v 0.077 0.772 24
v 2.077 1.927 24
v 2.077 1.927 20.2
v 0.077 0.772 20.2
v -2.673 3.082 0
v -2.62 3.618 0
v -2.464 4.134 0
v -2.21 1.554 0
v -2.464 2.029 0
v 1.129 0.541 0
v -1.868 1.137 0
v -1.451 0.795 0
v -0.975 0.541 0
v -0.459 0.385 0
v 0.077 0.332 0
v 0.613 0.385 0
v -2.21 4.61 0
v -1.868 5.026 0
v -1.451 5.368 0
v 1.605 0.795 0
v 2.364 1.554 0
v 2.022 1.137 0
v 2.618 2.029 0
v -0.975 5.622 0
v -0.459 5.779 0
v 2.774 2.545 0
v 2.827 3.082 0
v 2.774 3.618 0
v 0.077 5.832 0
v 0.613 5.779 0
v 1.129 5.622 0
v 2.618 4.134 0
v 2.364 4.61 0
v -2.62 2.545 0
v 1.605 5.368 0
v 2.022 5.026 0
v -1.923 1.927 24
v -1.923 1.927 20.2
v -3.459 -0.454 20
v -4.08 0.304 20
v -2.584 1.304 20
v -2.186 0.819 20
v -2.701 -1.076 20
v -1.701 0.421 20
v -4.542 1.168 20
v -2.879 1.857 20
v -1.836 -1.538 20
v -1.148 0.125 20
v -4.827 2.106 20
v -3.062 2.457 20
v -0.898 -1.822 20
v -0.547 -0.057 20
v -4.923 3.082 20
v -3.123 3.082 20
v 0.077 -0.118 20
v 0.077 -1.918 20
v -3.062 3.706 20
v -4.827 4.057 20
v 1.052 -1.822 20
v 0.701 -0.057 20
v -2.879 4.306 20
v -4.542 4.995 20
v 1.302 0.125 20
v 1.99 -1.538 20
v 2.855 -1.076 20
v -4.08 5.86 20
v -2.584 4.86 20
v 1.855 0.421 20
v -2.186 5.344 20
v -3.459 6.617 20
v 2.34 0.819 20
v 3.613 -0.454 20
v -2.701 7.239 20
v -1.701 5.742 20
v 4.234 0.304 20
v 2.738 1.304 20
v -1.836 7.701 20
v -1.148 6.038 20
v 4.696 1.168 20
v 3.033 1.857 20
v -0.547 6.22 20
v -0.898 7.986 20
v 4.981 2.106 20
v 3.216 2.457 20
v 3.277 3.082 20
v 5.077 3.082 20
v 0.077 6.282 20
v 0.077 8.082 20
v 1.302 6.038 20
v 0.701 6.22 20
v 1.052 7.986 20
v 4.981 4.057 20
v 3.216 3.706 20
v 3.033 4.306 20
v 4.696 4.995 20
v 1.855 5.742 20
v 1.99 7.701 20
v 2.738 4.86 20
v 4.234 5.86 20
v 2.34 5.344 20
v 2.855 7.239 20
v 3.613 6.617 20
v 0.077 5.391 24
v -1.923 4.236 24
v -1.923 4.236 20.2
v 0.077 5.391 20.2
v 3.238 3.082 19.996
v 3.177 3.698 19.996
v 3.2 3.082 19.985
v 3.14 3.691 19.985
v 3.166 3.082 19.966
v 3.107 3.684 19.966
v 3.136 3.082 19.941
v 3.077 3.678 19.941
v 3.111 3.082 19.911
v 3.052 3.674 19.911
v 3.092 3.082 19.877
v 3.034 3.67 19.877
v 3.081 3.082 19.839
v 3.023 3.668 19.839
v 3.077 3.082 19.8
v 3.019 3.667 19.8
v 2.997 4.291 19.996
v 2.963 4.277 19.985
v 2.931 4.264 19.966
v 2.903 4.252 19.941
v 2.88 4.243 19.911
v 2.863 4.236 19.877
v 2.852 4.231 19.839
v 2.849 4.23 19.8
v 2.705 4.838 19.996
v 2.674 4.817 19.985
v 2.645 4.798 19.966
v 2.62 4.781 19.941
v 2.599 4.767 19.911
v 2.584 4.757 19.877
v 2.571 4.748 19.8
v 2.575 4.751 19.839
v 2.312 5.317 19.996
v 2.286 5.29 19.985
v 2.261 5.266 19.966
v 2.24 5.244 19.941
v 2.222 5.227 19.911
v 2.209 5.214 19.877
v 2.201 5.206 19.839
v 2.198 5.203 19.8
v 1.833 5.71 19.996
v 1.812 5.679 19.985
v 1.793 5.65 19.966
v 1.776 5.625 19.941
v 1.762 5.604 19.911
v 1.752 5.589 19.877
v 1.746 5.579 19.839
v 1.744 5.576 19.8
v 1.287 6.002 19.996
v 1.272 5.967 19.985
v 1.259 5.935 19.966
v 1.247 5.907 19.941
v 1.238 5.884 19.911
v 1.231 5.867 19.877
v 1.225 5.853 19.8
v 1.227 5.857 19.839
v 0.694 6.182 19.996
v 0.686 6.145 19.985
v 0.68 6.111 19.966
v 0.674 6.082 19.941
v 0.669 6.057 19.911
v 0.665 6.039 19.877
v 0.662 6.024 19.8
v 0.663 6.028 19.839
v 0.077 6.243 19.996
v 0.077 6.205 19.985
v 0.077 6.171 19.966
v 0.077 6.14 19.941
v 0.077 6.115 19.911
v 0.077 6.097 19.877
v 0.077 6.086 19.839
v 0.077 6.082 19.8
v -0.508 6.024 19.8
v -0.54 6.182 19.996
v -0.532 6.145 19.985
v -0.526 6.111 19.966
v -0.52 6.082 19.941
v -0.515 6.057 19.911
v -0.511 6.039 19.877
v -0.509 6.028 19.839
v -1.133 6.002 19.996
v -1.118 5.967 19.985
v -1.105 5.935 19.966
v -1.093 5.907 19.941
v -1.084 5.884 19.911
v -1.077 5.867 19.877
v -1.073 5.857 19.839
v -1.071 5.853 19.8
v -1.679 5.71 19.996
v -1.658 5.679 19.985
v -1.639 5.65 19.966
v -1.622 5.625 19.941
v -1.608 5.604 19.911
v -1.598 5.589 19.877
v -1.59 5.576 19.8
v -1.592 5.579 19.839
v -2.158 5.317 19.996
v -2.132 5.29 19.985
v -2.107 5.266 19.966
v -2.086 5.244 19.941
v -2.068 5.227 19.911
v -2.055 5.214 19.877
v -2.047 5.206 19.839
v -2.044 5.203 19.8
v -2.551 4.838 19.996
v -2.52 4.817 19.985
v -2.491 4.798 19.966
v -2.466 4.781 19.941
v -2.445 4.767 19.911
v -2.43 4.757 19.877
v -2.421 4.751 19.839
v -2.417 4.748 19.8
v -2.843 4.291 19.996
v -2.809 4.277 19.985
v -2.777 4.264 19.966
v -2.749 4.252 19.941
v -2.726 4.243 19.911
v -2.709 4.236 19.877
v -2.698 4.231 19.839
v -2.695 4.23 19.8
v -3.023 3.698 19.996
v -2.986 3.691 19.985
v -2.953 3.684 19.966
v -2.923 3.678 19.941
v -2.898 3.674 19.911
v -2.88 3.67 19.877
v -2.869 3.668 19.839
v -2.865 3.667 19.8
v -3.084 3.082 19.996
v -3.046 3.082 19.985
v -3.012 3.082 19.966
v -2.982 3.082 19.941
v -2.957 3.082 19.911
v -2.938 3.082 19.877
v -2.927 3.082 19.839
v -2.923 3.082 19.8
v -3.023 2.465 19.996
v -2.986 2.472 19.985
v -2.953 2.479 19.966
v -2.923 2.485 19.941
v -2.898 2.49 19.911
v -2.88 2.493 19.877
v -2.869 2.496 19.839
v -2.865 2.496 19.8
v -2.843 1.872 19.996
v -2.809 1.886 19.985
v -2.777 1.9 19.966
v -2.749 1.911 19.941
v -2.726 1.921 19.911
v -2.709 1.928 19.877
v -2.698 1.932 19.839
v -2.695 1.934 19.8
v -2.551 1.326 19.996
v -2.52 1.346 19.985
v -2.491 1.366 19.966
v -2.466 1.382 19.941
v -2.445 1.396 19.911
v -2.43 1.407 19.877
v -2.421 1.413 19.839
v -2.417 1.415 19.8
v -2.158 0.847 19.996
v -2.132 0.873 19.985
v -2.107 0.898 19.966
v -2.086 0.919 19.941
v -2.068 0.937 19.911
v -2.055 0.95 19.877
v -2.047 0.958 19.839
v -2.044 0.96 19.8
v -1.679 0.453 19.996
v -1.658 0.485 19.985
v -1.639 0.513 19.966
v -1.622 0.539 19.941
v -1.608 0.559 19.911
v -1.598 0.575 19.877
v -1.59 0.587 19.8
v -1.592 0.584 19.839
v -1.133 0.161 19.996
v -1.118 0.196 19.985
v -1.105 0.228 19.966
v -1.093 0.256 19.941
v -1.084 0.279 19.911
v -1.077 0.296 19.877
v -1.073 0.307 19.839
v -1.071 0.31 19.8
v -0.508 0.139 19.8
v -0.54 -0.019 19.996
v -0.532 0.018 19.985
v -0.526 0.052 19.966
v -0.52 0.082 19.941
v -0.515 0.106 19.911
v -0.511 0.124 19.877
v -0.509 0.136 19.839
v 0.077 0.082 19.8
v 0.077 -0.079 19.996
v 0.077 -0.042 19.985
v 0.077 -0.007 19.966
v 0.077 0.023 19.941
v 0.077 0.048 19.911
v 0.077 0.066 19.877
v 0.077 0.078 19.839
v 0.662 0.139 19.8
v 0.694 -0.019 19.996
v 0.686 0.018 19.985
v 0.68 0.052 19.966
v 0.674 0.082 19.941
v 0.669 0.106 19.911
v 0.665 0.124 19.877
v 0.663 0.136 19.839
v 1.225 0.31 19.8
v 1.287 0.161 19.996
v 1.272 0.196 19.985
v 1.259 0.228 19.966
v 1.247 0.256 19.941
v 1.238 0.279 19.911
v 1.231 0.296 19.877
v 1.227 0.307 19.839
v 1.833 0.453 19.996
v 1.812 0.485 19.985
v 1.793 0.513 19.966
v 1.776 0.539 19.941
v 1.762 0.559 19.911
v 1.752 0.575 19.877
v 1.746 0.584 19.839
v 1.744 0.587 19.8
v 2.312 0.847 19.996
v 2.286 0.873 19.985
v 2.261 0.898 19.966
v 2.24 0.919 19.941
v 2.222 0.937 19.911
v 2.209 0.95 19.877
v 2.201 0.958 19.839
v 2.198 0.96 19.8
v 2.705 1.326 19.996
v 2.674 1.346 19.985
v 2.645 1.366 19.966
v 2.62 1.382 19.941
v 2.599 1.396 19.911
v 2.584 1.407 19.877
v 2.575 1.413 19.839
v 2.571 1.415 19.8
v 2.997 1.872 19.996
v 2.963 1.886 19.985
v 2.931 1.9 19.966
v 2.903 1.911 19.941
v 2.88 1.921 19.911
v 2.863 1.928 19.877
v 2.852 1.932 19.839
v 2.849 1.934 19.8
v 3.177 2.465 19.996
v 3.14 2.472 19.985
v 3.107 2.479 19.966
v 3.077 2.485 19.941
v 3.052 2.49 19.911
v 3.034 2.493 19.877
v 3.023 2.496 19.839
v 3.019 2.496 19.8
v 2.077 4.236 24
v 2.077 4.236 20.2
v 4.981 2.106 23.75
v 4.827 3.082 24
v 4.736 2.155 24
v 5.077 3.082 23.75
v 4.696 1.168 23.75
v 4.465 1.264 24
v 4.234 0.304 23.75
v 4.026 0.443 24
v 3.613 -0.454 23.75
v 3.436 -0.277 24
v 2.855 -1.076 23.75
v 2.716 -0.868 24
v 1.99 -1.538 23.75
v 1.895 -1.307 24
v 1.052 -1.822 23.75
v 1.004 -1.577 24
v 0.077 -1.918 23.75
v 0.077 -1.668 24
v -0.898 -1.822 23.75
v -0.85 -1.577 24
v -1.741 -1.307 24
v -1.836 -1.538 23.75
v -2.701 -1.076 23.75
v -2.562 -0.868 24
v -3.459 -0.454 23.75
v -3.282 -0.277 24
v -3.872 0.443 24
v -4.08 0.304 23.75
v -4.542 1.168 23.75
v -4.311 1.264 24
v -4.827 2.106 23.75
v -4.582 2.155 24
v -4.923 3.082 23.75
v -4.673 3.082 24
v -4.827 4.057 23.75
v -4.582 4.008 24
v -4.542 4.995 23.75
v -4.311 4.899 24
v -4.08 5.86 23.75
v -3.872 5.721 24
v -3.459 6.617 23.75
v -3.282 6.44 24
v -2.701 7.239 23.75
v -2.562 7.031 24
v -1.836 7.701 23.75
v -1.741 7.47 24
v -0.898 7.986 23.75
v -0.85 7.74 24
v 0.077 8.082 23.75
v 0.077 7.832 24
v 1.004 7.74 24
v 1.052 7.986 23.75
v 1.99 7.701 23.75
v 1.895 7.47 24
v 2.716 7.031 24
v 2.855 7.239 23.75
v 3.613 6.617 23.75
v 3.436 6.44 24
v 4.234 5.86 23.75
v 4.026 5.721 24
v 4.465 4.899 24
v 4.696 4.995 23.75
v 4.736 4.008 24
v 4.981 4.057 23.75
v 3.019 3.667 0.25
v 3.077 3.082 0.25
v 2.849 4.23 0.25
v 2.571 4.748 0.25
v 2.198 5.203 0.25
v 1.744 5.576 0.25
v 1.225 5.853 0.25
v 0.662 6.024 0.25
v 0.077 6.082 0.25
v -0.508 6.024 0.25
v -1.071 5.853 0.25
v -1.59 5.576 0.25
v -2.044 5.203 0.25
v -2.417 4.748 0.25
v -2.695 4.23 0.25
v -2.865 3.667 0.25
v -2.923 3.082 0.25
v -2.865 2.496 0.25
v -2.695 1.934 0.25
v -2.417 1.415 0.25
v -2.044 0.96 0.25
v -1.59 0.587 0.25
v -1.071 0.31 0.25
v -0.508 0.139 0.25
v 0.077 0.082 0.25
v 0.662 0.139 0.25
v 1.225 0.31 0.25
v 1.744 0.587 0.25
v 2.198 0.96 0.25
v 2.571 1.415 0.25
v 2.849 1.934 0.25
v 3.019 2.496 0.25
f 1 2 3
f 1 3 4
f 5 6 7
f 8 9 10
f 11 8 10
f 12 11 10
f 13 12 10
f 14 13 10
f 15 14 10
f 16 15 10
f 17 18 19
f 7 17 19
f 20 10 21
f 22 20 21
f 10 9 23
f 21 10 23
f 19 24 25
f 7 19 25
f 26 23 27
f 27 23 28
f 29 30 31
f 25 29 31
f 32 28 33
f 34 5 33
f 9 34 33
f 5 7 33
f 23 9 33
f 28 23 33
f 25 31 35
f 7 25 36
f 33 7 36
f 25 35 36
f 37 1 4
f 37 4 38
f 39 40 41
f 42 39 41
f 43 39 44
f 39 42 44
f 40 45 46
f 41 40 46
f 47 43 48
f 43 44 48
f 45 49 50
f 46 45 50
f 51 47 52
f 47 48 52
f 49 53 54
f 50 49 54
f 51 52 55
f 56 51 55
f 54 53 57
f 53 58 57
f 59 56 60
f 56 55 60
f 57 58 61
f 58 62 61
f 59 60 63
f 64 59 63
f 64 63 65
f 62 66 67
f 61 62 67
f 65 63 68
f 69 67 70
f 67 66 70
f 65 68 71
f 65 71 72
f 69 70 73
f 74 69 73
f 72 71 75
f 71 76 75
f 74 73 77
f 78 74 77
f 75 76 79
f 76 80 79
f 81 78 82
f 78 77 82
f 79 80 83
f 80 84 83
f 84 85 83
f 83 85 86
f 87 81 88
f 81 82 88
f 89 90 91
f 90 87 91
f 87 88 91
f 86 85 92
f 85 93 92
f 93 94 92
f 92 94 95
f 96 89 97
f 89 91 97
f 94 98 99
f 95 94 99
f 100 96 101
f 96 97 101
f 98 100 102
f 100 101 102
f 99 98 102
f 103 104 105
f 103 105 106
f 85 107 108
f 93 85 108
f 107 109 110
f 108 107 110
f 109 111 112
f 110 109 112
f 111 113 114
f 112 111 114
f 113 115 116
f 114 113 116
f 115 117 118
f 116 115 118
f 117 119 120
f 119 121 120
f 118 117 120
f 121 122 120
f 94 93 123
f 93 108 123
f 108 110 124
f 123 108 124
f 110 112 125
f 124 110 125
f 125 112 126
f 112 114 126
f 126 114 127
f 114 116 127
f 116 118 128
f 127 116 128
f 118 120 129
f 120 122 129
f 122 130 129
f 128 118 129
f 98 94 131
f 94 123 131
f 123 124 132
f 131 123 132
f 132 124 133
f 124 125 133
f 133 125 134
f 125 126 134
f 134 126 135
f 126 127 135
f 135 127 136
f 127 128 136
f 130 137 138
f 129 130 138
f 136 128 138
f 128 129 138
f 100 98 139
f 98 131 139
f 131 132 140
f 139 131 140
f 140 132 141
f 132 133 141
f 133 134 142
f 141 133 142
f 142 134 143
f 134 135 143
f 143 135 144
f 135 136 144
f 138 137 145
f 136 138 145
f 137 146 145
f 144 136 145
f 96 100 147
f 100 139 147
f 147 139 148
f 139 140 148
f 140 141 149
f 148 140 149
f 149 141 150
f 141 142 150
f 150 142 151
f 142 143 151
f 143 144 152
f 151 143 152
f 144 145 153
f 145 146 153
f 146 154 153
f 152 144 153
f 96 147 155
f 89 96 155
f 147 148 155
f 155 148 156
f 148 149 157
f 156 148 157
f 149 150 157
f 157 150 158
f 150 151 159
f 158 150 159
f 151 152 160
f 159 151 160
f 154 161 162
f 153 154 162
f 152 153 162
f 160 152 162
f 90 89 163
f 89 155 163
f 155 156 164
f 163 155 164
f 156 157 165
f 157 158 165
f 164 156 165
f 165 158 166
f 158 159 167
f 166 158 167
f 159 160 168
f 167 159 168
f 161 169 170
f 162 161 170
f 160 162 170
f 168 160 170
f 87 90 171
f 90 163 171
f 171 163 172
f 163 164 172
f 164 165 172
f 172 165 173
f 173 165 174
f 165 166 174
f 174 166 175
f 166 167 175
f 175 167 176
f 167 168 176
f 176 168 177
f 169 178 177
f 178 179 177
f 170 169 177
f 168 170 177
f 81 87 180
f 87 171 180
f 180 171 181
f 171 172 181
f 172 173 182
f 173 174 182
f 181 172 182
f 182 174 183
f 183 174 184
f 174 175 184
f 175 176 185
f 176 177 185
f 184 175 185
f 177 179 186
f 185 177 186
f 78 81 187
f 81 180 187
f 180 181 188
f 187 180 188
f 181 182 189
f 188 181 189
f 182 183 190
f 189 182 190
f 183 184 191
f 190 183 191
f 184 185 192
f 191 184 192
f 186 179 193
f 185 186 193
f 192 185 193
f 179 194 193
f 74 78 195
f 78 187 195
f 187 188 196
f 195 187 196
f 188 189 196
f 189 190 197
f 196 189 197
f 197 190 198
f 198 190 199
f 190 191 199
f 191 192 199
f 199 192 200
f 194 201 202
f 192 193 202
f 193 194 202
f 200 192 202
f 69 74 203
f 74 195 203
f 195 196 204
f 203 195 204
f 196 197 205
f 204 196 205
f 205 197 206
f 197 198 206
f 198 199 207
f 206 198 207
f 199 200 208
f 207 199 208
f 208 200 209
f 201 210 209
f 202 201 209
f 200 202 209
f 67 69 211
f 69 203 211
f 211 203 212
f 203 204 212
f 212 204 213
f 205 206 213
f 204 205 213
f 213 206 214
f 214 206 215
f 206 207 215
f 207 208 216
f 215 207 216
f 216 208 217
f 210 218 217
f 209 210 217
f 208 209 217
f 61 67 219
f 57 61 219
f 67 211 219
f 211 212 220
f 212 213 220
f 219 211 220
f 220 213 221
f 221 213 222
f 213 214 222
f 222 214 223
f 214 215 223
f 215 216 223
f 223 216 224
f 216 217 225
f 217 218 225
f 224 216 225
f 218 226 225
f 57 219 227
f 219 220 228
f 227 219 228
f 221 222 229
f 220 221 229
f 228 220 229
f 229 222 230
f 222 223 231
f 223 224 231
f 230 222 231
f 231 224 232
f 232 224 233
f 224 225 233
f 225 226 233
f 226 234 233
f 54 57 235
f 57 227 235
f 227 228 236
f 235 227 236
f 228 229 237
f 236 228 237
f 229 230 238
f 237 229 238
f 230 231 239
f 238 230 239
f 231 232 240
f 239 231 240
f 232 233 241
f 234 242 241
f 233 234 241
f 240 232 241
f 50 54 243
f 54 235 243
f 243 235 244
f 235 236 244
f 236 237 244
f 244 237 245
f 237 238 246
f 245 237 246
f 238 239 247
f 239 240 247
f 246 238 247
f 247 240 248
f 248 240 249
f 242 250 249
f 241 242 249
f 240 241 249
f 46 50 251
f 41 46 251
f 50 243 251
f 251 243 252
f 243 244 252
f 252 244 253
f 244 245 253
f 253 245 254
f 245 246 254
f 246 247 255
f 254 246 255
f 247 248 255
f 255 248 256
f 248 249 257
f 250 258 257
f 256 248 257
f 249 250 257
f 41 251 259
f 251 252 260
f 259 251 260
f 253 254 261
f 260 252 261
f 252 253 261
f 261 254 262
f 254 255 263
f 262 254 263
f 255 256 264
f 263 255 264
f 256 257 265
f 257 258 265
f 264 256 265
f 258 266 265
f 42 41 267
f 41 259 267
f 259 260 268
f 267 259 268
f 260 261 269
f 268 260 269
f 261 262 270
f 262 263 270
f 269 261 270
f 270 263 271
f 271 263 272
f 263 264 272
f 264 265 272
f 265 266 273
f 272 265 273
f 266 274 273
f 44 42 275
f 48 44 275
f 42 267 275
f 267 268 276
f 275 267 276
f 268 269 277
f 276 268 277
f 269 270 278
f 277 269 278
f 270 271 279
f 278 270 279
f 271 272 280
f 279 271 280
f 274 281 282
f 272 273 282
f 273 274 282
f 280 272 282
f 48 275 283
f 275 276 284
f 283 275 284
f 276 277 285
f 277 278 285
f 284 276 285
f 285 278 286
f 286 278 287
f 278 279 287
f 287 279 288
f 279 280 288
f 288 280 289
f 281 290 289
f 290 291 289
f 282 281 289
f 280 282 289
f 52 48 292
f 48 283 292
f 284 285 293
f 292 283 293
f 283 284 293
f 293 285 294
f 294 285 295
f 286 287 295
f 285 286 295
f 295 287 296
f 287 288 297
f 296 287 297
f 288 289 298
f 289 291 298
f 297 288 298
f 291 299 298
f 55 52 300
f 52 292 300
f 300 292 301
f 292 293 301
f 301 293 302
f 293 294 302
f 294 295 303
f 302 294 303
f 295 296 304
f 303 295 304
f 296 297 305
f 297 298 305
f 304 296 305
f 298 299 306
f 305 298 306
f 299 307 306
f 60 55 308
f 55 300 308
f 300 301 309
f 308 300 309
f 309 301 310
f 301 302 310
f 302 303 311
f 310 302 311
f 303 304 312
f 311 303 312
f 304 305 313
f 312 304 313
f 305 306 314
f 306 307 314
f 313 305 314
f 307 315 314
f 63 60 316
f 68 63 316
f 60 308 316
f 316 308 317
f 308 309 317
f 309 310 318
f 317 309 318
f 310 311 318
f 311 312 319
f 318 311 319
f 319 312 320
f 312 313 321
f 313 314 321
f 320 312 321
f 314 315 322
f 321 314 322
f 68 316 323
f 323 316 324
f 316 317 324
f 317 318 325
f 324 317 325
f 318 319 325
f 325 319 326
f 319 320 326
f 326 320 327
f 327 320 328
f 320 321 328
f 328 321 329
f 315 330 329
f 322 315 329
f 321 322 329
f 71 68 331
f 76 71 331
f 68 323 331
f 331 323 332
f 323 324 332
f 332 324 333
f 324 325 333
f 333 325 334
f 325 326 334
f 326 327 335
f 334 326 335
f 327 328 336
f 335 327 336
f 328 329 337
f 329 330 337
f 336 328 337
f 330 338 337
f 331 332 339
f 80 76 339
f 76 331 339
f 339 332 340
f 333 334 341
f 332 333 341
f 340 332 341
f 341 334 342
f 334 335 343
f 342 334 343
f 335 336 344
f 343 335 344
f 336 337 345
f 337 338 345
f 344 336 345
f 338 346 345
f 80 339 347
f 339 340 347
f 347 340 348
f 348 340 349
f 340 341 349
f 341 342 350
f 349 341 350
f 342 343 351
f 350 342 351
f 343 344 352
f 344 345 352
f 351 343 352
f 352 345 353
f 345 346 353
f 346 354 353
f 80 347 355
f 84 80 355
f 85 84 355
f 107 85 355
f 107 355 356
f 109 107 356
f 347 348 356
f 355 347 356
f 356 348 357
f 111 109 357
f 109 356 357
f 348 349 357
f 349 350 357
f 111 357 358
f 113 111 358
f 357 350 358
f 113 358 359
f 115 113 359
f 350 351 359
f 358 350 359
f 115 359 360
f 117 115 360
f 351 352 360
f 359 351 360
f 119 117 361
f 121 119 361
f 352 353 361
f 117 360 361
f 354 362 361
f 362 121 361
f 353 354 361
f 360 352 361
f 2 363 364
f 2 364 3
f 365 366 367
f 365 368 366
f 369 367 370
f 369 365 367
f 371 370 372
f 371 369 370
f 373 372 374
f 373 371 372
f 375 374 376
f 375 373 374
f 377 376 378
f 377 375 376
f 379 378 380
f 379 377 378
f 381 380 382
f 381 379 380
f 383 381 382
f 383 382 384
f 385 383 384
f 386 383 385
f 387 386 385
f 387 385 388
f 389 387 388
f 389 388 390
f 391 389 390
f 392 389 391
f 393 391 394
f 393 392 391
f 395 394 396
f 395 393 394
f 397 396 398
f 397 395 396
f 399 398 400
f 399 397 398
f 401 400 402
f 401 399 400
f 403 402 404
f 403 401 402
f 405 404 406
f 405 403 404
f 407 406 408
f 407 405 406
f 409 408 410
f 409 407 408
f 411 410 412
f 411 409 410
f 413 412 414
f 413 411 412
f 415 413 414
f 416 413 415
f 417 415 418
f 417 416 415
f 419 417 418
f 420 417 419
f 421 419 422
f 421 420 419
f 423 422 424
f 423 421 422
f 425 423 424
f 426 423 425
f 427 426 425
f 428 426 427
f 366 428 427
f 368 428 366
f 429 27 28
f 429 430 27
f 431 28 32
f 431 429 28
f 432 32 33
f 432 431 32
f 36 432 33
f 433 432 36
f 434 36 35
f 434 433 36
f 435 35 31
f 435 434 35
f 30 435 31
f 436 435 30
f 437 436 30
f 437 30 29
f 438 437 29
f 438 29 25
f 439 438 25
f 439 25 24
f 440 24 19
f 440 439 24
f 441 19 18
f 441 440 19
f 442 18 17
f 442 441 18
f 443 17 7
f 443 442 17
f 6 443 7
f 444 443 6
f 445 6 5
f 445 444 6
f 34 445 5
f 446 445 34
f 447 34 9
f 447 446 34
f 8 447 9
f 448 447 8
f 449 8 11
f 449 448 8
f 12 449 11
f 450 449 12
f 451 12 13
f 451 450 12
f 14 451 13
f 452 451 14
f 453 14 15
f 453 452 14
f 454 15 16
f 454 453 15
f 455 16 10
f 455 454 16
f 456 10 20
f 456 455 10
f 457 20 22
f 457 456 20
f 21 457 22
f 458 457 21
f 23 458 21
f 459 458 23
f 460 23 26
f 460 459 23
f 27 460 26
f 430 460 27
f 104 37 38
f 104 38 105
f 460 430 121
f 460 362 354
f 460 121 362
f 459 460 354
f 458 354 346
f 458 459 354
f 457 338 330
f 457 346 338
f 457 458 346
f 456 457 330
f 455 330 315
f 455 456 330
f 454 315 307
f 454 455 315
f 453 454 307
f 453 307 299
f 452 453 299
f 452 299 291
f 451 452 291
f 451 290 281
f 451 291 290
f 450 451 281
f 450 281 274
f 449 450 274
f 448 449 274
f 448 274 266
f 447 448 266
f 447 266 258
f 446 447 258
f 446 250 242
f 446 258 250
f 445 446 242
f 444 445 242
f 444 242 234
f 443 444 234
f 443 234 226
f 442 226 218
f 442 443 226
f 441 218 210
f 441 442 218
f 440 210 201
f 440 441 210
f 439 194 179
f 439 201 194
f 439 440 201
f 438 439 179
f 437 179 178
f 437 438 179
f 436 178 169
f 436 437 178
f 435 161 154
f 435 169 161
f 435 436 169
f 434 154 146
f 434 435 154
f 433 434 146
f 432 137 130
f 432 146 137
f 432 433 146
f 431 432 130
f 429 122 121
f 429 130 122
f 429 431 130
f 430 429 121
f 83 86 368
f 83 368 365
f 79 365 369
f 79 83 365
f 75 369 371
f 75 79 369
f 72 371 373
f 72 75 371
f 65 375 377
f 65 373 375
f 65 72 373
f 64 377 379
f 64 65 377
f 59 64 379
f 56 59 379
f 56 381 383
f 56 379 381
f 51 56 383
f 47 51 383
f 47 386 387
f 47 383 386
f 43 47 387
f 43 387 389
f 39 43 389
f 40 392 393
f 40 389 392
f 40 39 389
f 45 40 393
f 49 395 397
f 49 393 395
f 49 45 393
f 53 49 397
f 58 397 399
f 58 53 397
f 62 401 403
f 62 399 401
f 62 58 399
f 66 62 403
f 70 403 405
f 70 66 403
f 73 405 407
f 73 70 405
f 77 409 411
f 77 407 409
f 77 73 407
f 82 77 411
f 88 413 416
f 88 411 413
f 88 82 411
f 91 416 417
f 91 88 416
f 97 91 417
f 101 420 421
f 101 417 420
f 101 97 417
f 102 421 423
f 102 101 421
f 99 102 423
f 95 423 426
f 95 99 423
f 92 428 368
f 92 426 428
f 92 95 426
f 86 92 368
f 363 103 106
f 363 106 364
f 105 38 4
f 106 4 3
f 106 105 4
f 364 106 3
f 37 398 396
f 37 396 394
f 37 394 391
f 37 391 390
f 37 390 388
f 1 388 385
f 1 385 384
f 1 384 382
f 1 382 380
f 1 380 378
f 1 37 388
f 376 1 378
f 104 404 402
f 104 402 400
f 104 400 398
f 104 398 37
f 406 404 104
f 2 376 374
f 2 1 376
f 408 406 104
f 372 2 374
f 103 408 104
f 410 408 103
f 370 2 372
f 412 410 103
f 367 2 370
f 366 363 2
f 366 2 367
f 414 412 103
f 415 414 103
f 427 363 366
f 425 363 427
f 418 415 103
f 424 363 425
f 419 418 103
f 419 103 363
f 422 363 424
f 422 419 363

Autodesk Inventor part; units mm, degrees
ref_plane "YZ Plane" through (0, 0, 0) normal (1, 0, 0) x (0, 1, 0)
ref_plane "XZ Plane" through (0, 0, 0) normal (0, 1, 0) x (-1, 0, 0)
ref_plane "XY Plane" through (0, 0, 0) normal (0, 0, 1) x (1, 0, 0)
sketch "Sketch1" plane through (0, 0, 0) normal (0, 0, 1) x (1, 0, 0)
  circle A0 centre (0.077, 3.0817) radius 3
  dimension "Diameter" = 6
extrude "Extrusion1" add sketch "Sketch1" along normal blind 20
sketch "Sketch2" plane through (0.077, 3.0817, 20) normal (0, 0, 1) x (1, 0, 0)
  circle A0 centre (0, 0) radius 3 projected
  circle A1 centre (0, 0) radius 5
  dimension "Head_Diameter" = 10
extrude "Extrusion2" add sketch "Sketch2" along normal blind 4 contours A0 | A1
sketch "Sketch3" plane through (0.077, 3.0817, 24) normal (0, 0, 1) x (1, 0, 0)
  circle A0 centre (0, 0) radius 5 projected
  line L0 (0, -2.3094) -> (-2, -1.1547)
  line L1 (-2, -1.1547) -> (-2, 1.1547)
  line L2 (-2, 1.1547) -> (0, 2.3094)
  line L3 (0, 2.3094) -> (2, 1.1547)
  line L4 (2, 1.1547) -> (2, -1.1547)
  line L5 (2, -1.1547) -> (0, -2.3094)
  dimension "Hex_Key_Size" = 4
extrude "Extrusion3" cut sketch "Sketch3" against normal blind 3.8 contours L0 L1 L2 L3 L4 L5
thread "Thread1" size "M6x1" class "6g" standard "ANSI Metric M Profile" length 18
fillet "Fillet1" radius 0.2 1 edges at (-2.923, 3.0817, 20)
chamfer "Chamfer1" distance 0.25 angle 45 2 edges at (-4.923, 3.0817, 24) (-2.923, 3.0817, 0)
equation "\"d9\" = Thread_Length"
equation "\"d13\" = Chamfer"
equation "\"Thread_Length\" = 18"
equation "\"Chamfer\" = 0.25"
properties part number "SCREW,LOW SOCKET HD M6x1x20MM" material "Purchased Component, Altered"
